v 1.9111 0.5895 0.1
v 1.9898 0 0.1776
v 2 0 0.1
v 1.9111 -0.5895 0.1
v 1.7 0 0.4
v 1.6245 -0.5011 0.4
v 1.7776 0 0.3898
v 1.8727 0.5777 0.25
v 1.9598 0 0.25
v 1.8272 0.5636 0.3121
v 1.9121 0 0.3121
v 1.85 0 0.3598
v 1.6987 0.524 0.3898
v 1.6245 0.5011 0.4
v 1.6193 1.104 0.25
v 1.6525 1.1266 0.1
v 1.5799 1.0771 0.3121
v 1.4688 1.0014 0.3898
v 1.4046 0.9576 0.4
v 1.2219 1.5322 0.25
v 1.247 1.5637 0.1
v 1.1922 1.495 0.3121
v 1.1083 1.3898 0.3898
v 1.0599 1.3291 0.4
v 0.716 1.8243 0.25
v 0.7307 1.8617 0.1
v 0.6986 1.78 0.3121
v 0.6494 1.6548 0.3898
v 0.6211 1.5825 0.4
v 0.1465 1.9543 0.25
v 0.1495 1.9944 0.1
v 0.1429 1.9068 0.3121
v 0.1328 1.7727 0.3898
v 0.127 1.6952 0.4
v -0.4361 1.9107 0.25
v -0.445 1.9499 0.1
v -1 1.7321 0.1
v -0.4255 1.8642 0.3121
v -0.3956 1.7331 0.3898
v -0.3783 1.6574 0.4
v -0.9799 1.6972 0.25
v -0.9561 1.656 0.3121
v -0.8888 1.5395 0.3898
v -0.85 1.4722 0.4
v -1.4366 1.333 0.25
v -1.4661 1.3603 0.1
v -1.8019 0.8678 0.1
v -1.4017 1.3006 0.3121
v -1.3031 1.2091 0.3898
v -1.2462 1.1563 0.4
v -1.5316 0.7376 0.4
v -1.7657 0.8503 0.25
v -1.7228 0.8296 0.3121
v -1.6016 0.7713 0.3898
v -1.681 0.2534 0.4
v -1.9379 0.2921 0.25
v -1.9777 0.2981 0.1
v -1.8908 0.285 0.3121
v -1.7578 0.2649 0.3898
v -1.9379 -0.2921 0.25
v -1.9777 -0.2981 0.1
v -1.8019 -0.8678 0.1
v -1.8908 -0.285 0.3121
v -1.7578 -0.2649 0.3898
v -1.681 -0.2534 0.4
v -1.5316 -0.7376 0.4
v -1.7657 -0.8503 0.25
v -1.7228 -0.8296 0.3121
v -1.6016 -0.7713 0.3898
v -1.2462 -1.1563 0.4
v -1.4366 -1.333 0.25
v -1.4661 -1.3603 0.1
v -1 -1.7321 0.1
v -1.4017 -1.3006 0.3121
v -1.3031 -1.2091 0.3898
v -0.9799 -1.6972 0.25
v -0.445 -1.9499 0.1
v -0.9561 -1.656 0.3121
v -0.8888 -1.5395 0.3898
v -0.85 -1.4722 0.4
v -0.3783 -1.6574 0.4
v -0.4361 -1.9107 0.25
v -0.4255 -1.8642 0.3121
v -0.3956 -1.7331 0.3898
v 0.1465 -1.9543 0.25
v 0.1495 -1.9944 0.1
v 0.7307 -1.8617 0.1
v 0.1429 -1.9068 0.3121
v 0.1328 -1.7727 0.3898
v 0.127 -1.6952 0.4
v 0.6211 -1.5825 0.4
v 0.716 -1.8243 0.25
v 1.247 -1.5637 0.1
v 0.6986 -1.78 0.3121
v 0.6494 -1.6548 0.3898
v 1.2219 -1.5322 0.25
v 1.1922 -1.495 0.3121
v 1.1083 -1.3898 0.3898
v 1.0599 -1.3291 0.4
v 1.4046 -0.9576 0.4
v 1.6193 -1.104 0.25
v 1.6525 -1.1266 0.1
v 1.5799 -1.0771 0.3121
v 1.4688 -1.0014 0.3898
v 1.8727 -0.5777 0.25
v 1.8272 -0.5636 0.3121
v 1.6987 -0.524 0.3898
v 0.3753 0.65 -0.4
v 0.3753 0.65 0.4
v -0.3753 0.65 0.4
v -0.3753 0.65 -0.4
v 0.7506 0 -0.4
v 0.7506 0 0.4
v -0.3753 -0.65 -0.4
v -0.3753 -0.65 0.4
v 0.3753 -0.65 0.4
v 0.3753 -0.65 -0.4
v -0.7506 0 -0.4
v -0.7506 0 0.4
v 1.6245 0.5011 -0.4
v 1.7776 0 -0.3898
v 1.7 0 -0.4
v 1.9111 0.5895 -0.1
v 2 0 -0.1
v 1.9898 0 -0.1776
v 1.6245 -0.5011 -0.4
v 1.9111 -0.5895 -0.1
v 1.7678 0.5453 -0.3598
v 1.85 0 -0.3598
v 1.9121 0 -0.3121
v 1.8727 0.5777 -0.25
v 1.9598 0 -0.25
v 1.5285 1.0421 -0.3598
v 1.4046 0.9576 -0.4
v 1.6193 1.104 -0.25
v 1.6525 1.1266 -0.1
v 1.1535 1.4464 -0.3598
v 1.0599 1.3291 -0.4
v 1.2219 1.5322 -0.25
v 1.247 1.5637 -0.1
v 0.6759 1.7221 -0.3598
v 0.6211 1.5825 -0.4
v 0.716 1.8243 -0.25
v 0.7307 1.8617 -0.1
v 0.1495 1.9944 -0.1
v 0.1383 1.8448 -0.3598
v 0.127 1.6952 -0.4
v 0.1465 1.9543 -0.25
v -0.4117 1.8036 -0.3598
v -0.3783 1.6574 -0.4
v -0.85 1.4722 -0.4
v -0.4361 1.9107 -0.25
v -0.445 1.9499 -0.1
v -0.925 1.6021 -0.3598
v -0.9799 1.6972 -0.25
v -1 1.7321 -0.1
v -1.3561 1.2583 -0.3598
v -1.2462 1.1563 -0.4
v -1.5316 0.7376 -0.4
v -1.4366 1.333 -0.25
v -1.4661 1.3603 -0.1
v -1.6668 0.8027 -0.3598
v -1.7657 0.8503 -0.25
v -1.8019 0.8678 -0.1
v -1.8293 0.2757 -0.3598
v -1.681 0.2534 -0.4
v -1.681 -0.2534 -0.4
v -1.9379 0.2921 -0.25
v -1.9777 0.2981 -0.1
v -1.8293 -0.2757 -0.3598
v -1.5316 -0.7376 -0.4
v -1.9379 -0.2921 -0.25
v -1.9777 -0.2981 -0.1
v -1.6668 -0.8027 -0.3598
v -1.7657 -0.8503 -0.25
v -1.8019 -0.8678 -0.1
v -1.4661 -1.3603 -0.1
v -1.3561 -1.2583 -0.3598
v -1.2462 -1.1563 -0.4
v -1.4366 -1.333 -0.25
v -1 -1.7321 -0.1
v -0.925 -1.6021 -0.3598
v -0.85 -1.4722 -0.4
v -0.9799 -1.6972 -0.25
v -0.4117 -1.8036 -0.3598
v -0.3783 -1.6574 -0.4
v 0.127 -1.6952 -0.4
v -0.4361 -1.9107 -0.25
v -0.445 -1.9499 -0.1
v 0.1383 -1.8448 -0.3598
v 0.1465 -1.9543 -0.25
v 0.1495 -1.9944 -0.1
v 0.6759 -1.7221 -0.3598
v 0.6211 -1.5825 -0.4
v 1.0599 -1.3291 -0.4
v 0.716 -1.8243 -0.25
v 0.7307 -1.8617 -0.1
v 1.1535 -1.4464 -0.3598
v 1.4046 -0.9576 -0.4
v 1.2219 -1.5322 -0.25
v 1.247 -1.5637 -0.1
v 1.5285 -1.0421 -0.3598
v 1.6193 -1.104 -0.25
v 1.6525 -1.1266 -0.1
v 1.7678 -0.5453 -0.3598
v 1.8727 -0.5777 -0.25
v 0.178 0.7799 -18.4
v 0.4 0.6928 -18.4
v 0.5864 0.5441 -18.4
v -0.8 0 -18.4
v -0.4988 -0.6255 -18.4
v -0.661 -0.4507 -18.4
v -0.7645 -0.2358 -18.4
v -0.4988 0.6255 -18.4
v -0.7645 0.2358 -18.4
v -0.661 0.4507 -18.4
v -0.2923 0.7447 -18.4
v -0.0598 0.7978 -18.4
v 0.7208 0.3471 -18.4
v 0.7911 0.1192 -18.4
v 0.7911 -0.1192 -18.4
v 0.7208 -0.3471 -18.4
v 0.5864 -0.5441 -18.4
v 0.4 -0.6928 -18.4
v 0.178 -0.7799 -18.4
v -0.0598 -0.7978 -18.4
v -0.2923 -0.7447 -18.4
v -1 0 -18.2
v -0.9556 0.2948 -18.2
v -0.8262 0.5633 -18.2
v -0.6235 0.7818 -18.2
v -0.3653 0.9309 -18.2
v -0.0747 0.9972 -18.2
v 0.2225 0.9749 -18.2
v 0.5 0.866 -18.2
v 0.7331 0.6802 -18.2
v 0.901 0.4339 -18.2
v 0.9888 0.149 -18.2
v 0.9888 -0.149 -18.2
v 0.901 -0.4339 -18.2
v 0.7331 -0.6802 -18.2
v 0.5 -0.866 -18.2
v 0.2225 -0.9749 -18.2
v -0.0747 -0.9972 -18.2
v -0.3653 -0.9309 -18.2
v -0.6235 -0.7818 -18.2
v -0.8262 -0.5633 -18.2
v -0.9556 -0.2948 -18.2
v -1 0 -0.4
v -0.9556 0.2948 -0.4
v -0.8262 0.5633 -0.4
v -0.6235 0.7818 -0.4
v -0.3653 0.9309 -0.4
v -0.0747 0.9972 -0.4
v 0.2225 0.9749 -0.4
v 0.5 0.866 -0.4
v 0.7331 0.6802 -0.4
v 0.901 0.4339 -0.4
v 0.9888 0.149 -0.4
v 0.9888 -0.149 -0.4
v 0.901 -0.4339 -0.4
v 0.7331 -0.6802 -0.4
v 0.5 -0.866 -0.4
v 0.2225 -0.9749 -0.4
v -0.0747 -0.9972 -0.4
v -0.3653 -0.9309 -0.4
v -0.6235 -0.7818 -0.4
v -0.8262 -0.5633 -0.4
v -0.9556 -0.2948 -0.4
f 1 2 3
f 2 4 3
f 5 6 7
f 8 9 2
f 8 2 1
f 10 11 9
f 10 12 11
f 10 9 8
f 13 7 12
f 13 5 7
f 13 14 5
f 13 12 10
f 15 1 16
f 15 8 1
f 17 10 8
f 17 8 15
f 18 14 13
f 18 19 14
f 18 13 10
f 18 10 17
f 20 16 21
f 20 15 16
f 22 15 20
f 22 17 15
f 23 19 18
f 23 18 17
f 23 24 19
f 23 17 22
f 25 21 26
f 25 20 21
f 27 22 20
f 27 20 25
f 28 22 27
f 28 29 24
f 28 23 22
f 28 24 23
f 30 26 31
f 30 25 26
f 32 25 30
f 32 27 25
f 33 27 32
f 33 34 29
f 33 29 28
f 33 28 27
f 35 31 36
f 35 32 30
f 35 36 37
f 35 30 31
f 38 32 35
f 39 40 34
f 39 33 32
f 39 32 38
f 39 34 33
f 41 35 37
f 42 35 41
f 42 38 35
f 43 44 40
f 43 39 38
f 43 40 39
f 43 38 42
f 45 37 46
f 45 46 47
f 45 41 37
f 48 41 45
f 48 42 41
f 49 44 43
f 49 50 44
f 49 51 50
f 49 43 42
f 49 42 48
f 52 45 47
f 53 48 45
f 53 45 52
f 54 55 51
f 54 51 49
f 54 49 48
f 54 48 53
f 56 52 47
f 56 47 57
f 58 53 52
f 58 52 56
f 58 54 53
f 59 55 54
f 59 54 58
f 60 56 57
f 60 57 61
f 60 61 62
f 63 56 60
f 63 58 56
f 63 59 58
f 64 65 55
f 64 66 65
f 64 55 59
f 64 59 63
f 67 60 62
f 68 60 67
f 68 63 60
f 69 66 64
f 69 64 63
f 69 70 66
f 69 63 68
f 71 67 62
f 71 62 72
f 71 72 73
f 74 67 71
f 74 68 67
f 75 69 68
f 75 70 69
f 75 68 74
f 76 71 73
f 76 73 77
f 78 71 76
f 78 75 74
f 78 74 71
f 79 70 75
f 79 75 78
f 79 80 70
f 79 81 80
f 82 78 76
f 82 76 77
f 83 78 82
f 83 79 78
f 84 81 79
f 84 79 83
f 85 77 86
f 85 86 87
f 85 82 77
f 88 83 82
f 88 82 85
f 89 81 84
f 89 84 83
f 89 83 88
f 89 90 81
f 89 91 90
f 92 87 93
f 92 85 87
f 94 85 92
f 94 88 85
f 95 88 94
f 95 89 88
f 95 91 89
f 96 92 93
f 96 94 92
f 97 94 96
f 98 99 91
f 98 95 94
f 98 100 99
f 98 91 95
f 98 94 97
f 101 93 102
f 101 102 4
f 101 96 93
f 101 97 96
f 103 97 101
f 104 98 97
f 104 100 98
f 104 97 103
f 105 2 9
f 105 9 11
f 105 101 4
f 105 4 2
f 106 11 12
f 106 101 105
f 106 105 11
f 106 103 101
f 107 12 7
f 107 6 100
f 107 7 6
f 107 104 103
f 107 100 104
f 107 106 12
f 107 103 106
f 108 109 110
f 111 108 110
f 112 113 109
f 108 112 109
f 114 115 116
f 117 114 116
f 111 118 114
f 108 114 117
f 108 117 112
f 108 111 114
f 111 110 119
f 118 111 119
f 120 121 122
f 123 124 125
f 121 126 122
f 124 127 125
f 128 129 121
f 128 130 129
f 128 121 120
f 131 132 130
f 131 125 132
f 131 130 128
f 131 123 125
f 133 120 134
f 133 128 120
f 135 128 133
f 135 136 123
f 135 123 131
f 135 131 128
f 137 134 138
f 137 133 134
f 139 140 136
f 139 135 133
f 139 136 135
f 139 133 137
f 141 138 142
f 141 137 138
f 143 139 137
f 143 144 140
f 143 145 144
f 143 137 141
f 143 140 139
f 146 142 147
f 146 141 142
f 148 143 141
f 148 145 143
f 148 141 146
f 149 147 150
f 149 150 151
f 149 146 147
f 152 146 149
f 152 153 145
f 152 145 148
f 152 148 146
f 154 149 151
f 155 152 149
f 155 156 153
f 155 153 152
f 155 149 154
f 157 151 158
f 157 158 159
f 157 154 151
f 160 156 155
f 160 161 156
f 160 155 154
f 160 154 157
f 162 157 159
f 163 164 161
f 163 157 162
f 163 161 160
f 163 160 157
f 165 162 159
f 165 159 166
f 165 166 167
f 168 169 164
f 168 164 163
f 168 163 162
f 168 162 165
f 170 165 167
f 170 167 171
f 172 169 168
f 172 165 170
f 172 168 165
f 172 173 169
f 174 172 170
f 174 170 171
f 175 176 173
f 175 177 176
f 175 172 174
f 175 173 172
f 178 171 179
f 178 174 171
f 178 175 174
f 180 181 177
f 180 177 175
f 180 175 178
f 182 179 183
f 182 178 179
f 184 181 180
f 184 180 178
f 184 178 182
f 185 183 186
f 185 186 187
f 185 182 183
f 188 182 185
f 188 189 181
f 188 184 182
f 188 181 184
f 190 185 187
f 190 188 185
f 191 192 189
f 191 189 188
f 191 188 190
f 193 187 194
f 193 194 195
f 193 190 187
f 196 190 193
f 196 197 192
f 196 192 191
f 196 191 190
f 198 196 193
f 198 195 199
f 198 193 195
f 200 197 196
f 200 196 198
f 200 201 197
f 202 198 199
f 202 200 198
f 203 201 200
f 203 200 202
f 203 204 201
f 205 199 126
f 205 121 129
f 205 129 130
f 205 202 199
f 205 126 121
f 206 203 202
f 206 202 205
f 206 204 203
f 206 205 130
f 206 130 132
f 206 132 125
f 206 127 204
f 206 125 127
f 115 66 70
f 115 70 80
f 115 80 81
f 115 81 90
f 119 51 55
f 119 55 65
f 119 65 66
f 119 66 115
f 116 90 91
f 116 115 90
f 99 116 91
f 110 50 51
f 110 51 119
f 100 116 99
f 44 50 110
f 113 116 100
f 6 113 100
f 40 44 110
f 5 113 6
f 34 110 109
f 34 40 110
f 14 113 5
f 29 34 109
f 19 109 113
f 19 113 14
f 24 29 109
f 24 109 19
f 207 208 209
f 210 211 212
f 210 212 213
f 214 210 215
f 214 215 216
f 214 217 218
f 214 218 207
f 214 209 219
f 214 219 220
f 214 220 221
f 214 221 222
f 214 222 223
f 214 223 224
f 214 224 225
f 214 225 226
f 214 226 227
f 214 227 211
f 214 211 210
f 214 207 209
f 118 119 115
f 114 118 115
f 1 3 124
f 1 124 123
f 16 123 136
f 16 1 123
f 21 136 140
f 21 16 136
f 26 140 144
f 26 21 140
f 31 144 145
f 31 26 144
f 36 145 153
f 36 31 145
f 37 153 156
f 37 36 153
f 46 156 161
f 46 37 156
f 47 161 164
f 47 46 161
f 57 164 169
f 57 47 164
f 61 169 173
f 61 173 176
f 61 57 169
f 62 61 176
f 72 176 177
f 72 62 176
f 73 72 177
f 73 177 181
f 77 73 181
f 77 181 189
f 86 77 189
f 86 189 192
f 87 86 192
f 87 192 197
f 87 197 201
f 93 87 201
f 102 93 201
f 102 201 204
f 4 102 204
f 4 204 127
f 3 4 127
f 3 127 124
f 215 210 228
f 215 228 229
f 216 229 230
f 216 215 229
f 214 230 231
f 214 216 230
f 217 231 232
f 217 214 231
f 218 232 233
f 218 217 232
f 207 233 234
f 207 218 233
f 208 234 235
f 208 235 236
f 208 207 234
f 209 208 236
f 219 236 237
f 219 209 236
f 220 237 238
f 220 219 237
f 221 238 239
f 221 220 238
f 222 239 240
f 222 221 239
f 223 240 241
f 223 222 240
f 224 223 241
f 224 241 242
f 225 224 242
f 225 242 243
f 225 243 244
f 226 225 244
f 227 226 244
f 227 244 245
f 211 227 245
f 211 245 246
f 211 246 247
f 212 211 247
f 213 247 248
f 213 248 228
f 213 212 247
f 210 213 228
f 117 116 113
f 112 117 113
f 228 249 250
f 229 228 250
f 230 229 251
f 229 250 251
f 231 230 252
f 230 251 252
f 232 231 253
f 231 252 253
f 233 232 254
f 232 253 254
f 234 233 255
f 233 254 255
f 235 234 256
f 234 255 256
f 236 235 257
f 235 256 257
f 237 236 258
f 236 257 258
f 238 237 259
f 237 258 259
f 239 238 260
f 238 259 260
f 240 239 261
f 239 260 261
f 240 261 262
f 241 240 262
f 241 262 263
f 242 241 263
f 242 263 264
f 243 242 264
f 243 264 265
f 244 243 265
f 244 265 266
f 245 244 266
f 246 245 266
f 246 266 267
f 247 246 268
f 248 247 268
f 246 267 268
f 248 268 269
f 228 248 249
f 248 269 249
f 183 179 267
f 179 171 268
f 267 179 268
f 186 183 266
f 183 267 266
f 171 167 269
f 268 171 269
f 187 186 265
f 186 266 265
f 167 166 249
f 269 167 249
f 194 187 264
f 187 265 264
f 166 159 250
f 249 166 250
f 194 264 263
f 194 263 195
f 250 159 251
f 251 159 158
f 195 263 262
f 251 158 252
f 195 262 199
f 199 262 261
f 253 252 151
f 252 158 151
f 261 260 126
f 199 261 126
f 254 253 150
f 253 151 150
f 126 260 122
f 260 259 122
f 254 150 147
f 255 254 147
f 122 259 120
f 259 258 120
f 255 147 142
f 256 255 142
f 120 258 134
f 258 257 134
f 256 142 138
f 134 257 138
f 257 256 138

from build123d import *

# Parameters (mm, degrees)
SKETCH_1_R          = 2
EXTRUDE_1_DEPTH     = 0.4
SKETCH_2_R          = 1
EXTRUDE_2_DEPTH     = 18
CHAMFER_1_SIZE      = 0.2
CUT_EXTRUDE_1_DEPTH = 0.8
FILLET_2_R          = 0.3


with BuildPart() as part:
    # 草图1 → 凸台-拉伸1 (new body, symmetric)
    with BuildSketch(Plane.XY):
        Circle(SKETCH_1_R)
    extrude(amount=EXTRUDE_1_DEPTH, both=True)

    # 草图2 → 凸台-拉伸2 (add)
    with BuildSketch(Plane(origin=(0, 0, -0.4), x_dir=(-1, 0, 0), z_dir=(0, 0, -1))):
        Circle(SKETCH_2_R)
    extrude(amount=EXTRUDE_2_DEPTH)

    # 倒角1
    chamfer_1_edges = [part.edges().sort_by_distance(p)[0] for p in [
        (1, 0, -18.4),
    ]]
    chamfer(chamfer_1_edges, length=CHAMFER_1_SIZE)

    # 草图3 → 切除-拉伸1 (cut)
    with BuildSketch(Plane.XY.offset(0.4)):
        Polygon((0.75055535, 0), (0.375277675, 0.65), (-0.375277675, 0.65), (-0.75055535, 0), (-0.375277675, -0.65), (0.375277675, -0.65), align=None)
    extrude(amount=-CUT_EXTRUDE_1_DEPTH, mode=Mode.SUBTRACT)

    # 圆角2
    fillet_2_edges = [part.edges().sort_by_distance(p)[0] for p in [
        (-2, 0, -0.4),
        (-2, 0, 0.4),
    ]]
    fillet(fillet_2_edges, radius=FILLET_2_R)


solid = part.part
